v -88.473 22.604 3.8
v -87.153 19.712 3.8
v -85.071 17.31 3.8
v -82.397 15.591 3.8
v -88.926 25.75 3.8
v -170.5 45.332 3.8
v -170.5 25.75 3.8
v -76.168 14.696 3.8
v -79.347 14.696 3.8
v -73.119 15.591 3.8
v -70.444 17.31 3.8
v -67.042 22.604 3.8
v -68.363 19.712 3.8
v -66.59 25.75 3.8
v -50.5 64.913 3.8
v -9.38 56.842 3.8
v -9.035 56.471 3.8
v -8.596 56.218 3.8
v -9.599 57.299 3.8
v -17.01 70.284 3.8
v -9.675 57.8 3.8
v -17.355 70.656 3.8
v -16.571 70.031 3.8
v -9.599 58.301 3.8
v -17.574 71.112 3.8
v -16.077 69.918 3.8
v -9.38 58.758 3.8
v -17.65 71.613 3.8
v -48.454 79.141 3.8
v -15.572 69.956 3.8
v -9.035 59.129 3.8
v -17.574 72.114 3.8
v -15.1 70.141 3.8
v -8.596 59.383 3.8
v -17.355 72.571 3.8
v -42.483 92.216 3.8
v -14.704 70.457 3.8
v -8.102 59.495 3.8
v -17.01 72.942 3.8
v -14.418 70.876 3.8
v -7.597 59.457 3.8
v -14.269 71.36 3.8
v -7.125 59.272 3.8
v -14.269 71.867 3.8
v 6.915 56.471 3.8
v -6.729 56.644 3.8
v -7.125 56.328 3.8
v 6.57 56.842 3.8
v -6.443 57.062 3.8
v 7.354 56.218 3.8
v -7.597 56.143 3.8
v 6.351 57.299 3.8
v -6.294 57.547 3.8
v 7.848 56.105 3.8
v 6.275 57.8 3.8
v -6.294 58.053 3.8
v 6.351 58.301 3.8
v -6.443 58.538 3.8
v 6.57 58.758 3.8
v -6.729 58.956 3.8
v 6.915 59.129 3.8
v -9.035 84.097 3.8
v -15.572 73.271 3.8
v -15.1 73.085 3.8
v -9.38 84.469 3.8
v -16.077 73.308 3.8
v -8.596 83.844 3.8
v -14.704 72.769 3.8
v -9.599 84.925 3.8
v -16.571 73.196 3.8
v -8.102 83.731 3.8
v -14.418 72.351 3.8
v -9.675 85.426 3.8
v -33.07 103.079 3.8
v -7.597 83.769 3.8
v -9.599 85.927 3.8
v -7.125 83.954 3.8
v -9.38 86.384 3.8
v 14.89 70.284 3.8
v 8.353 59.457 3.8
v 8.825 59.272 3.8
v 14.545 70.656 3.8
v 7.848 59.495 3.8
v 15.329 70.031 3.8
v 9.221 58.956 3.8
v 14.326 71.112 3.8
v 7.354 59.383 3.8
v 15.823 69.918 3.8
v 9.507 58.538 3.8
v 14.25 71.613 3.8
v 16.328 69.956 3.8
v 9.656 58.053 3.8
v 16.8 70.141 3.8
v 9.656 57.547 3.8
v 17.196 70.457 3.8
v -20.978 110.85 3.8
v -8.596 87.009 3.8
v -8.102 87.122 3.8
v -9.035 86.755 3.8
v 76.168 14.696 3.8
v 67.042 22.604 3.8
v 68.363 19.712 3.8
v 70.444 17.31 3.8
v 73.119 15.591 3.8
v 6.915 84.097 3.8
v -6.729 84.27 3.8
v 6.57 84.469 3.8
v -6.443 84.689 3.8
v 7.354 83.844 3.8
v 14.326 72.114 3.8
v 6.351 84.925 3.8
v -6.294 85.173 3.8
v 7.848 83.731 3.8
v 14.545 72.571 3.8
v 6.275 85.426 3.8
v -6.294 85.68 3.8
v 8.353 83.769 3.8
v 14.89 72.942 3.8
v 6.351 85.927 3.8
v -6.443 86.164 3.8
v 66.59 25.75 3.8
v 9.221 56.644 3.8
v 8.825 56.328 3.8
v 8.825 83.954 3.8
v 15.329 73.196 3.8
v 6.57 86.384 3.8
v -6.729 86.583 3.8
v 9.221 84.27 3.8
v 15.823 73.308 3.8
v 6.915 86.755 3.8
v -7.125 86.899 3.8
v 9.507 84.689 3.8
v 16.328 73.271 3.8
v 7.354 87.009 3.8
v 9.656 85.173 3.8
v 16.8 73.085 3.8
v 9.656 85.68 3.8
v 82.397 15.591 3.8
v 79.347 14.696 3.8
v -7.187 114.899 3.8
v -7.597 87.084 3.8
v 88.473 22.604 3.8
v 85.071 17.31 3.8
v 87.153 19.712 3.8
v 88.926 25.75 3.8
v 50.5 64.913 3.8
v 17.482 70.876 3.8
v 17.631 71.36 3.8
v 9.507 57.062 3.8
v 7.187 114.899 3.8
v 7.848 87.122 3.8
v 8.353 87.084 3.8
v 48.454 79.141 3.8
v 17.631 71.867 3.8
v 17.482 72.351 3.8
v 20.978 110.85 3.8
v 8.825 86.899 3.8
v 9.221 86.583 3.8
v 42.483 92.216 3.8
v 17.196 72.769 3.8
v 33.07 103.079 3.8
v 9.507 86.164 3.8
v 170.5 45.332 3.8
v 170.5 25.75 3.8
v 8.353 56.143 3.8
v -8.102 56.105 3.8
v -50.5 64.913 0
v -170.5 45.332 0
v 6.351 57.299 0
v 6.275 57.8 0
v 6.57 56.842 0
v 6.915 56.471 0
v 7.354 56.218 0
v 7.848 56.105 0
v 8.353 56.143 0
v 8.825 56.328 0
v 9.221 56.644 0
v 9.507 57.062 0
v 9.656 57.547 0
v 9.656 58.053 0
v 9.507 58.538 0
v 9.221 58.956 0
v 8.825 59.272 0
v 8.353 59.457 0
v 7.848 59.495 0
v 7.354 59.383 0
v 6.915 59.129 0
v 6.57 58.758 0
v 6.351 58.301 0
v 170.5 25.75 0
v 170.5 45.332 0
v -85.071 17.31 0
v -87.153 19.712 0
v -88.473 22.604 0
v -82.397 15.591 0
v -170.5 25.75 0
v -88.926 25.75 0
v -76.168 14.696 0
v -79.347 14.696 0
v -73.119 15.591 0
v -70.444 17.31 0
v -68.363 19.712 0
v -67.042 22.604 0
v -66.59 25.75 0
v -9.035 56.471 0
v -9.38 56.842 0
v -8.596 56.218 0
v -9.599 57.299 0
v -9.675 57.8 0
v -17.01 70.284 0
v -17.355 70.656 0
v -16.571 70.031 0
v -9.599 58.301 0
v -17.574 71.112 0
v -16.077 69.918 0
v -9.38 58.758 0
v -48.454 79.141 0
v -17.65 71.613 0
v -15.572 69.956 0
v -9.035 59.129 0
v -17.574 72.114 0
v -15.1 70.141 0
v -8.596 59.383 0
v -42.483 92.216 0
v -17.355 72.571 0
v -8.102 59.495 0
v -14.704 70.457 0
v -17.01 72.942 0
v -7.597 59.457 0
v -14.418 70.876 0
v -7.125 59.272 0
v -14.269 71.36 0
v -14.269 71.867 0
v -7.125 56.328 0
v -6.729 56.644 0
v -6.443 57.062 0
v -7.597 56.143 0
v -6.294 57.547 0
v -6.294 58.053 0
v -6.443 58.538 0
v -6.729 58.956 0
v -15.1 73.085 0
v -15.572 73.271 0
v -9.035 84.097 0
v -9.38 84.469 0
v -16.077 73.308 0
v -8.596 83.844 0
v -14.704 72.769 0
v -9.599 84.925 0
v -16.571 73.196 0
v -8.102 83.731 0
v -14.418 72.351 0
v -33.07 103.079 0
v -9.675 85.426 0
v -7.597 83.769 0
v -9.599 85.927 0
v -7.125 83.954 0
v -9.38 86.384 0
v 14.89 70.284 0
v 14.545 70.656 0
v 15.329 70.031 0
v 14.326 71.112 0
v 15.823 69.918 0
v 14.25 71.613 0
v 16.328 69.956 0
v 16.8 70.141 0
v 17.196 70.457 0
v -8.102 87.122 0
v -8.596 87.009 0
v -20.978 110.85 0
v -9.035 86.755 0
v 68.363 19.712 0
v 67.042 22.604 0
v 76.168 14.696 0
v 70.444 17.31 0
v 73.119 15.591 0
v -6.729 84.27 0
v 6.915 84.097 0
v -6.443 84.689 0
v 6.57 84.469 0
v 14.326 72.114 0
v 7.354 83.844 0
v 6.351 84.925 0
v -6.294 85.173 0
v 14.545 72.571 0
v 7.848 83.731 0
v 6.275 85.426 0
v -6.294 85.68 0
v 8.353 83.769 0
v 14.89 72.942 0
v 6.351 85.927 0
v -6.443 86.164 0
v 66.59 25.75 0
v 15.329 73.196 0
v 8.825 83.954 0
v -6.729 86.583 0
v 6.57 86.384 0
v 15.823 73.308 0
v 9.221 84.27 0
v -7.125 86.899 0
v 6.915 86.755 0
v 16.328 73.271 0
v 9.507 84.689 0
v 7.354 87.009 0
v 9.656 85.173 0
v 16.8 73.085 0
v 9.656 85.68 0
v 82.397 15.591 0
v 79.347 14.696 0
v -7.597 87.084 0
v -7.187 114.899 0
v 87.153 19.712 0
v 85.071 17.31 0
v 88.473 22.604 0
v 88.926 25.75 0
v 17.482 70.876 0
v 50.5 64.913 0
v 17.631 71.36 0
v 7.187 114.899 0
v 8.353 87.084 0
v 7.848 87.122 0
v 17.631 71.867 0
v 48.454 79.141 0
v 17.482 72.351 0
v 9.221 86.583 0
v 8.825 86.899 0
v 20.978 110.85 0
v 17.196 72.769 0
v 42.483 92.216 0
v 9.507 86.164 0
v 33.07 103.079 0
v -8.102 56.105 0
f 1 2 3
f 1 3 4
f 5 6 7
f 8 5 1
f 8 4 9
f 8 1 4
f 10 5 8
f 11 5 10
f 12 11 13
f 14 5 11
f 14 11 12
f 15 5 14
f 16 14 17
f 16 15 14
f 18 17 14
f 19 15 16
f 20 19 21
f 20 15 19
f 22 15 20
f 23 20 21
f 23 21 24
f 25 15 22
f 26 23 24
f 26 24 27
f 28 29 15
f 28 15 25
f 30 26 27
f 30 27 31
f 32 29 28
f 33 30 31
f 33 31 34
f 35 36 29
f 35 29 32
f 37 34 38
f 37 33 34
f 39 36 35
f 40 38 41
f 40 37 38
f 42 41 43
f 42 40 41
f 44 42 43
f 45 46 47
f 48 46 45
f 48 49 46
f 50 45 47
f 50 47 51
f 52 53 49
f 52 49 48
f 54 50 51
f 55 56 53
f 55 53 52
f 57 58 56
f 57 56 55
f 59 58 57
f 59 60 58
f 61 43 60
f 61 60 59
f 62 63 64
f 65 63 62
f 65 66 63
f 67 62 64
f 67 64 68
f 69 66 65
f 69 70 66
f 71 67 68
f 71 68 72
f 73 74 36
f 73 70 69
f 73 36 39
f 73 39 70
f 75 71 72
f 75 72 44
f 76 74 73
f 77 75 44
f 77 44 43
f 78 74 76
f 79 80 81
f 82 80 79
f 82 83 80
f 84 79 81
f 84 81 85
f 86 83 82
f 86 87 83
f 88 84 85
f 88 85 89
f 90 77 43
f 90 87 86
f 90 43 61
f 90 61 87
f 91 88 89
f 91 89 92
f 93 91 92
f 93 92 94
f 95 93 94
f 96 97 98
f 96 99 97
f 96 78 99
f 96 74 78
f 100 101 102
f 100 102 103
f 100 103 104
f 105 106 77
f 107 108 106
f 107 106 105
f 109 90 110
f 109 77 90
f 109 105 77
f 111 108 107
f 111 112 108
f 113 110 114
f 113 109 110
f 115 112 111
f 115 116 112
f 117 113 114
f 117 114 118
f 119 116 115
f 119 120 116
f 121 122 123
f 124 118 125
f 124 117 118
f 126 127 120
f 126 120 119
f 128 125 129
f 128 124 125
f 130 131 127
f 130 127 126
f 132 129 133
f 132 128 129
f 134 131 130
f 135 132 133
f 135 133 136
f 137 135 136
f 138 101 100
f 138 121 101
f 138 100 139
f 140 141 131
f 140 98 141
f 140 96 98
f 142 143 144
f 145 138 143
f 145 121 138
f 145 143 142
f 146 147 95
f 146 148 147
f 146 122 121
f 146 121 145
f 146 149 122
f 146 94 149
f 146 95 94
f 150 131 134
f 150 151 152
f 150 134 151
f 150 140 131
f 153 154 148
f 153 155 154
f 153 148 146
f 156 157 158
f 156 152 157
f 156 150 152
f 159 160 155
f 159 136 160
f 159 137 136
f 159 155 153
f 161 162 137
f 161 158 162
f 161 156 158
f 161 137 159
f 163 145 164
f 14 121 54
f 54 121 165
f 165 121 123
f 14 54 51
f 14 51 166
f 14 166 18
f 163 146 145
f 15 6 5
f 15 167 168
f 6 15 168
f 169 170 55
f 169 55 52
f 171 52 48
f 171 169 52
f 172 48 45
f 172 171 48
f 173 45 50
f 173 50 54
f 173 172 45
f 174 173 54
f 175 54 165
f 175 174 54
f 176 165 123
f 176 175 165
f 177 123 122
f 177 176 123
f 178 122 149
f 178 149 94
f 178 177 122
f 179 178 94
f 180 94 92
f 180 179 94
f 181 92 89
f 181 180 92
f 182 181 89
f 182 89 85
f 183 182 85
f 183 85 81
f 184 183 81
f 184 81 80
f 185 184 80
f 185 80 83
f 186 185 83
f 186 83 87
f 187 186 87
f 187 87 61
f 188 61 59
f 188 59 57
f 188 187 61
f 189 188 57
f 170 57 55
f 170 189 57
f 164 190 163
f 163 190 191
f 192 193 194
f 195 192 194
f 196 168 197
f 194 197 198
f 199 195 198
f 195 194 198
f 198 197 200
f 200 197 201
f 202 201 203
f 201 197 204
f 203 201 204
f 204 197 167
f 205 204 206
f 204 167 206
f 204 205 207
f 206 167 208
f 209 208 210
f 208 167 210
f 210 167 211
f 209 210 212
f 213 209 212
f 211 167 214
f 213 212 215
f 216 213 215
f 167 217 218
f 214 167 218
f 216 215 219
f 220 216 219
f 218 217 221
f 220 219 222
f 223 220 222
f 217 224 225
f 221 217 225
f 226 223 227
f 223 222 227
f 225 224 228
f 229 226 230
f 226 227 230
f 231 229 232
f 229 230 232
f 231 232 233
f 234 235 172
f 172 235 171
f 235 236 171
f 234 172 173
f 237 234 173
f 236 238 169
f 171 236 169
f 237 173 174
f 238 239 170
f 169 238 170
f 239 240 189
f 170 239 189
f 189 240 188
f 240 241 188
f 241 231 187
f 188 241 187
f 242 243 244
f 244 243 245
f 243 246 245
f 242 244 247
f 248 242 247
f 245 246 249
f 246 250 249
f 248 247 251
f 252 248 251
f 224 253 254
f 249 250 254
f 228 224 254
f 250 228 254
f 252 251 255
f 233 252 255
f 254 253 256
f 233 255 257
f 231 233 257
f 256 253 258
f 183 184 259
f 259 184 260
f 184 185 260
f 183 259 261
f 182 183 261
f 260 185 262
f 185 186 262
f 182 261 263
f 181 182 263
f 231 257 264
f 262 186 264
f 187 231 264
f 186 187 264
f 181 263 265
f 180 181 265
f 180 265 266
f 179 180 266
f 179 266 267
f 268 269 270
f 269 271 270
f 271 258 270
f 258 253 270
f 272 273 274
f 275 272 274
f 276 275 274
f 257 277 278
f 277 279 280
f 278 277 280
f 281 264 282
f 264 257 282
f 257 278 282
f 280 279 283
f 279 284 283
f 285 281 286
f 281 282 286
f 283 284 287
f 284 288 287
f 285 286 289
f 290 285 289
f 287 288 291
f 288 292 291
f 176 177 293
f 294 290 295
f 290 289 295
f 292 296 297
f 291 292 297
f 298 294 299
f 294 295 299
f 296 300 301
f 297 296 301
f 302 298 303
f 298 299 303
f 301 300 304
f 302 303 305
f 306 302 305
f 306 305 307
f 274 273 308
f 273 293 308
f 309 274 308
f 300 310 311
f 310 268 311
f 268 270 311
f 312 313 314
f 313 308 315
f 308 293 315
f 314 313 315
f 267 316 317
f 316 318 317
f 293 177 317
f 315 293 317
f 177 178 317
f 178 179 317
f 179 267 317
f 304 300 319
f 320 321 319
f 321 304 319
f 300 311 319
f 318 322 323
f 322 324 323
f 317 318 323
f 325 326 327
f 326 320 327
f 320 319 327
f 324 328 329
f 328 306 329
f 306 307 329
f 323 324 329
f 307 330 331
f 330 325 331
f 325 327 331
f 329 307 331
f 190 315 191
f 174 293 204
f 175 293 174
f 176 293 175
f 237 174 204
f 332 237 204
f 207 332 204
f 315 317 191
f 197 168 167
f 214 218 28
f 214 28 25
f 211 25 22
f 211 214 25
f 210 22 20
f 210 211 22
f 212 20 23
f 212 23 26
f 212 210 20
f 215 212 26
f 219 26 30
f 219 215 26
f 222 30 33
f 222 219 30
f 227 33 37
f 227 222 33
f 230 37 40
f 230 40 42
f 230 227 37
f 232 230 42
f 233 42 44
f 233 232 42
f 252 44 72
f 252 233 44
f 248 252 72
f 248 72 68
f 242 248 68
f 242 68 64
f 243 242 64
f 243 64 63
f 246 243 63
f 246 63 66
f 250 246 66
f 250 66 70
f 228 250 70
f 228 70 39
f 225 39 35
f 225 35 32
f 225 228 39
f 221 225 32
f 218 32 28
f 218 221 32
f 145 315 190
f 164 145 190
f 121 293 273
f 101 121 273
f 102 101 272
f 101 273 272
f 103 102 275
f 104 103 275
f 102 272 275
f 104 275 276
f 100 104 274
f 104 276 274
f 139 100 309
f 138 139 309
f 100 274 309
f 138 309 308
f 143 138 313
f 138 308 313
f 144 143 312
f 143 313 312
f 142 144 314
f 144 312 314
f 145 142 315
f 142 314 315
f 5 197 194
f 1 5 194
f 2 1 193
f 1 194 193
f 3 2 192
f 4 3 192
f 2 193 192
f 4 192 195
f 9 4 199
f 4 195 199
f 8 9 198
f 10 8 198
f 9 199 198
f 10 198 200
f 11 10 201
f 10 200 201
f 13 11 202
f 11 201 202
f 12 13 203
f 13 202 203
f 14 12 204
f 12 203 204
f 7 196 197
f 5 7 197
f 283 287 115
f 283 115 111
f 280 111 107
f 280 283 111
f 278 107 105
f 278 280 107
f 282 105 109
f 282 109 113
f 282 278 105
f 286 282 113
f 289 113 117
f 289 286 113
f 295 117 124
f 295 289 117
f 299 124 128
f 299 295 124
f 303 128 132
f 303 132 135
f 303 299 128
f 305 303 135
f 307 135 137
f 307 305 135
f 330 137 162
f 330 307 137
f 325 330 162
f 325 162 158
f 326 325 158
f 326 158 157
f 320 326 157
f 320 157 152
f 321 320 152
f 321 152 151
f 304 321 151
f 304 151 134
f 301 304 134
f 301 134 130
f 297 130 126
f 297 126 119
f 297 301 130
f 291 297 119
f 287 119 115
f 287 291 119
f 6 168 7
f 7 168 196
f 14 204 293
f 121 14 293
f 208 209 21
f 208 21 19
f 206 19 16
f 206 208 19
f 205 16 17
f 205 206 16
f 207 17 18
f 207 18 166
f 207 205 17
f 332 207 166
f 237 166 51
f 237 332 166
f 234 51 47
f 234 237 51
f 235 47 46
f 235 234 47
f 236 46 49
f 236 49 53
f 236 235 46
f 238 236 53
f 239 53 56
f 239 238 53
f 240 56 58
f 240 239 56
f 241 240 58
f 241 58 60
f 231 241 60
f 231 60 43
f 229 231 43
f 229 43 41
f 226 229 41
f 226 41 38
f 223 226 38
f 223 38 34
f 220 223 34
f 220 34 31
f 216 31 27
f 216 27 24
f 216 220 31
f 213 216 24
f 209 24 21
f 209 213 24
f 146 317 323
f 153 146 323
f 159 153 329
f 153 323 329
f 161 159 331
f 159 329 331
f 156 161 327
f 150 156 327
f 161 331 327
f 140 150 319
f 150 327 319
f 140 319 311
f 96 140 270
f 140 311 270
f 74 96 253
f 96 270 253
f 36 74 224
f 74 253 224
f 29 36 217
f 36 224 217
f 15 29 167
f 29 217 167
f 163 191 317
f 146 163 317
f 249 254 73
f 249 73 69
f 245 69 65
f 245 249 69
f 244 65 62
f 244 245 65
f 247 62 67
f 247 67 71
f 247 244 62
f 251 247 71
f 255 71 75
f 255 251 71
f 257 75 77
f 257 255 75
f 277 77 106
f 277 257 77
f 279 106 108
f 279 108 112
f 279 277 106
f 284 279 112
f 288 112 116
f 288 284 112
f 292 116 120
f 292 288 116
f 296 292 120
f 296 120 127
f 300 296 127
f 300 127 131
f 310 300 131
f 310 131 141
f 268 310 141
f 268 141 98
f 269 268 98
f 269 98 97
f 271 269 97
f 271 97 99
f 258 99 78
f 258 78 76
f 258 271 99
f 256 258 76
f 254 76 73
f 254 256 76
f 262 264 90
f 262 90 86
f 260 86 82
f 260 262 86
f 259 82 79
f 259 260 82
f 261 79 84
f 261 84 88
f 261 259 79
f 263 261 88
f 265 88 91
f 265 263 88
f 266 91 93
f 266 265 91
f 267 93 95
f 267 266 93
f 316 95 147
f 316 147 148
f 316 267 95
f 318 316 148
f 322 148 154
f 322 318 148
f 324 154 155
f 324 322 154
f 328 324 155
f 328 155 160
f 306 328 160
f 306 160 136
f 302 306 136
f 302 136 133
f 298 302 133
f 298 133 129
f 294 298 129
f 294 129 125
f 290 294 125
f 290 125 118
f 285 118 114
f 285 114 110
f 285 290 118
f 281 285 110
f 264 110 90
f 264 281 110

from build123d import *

# Parameters (mm, degrees)
SKETCH1_R           = 1.7
BOSS_EXTRUDE1_DEPTH = 3.8


with BuildPart() as part:
    # Sketch1 → Boss-Extrude1 (new body)
    with BuildSketch(Plane.XY):
        with BuildLine():
            Line((-170.500000005, 25.75), (-88.925688775, 25.75))
            ThreePointArc((-88.925688775, 25.75), (-77.757832362, 14.582143587), (-66.589975949, 25.75))
            Line((-66.589975949, 25.75), (66.589975949, 25.75))
            ThreePointArc((66.589975949, 25.75), (77.757832362, 14.582143587), (88.925688775, 25.75))
            Line((88.925688775, 25.75), (170.500000005, 25.75))
            Line((170.500000005, 25.75), (170.500000005, 45.331584009))
            Line((170.500000005, 45.331584009), (50.500000005, 64.913168018))
            ThreePointArc((50.500000005, 64.913168018), (0, 115.413168023), (-50.500000005, 64.913168018))
            Line((-50.500000005, 64.913168018), (-170.500000005, 45.331584009))
            Line((-170.500000005, 45.331584009), (-170.500000005, 25.75))
        make_face()
        with Locations(Location((15.95, 71.613168018, 0), (0, 0, 180))):
            Circle(SKETCH1_R, mode=Mode.SUBTRACT)
        with Locations(Location((7.975, 57.800062828, 0), (0, 0, 180))):
            Circle(SKETCH1_R, mode=Mode.SUBTRACT)
        with Locations(Location((-7.975, 57.800062828, 0), (0, 0, 180))):
            Circle(SKETCH1_R, mode=Mode.SUBTRACT)
        with Locations(Location((-15.95, 71.613168018, 0), (0, 0, 180))):
            Circle(SKETCH1_R, mode=Mode.SUBTRACT)
        with Locations(Location((7.975, 85.426273209, 0), (0, 0, 180))):
            Circle(SKETCH1_R, mode=Mode.SUBTRACT)
        with Locations(Location((-7.975, 85.426273209, 0), (0, 0, 180))):
            Circle(SKETCH1_R, mode=Mode.SUBTRACT)
    extrude(amount=BOSS_EXTRUDE1_DEPTH)


solid = part.part
